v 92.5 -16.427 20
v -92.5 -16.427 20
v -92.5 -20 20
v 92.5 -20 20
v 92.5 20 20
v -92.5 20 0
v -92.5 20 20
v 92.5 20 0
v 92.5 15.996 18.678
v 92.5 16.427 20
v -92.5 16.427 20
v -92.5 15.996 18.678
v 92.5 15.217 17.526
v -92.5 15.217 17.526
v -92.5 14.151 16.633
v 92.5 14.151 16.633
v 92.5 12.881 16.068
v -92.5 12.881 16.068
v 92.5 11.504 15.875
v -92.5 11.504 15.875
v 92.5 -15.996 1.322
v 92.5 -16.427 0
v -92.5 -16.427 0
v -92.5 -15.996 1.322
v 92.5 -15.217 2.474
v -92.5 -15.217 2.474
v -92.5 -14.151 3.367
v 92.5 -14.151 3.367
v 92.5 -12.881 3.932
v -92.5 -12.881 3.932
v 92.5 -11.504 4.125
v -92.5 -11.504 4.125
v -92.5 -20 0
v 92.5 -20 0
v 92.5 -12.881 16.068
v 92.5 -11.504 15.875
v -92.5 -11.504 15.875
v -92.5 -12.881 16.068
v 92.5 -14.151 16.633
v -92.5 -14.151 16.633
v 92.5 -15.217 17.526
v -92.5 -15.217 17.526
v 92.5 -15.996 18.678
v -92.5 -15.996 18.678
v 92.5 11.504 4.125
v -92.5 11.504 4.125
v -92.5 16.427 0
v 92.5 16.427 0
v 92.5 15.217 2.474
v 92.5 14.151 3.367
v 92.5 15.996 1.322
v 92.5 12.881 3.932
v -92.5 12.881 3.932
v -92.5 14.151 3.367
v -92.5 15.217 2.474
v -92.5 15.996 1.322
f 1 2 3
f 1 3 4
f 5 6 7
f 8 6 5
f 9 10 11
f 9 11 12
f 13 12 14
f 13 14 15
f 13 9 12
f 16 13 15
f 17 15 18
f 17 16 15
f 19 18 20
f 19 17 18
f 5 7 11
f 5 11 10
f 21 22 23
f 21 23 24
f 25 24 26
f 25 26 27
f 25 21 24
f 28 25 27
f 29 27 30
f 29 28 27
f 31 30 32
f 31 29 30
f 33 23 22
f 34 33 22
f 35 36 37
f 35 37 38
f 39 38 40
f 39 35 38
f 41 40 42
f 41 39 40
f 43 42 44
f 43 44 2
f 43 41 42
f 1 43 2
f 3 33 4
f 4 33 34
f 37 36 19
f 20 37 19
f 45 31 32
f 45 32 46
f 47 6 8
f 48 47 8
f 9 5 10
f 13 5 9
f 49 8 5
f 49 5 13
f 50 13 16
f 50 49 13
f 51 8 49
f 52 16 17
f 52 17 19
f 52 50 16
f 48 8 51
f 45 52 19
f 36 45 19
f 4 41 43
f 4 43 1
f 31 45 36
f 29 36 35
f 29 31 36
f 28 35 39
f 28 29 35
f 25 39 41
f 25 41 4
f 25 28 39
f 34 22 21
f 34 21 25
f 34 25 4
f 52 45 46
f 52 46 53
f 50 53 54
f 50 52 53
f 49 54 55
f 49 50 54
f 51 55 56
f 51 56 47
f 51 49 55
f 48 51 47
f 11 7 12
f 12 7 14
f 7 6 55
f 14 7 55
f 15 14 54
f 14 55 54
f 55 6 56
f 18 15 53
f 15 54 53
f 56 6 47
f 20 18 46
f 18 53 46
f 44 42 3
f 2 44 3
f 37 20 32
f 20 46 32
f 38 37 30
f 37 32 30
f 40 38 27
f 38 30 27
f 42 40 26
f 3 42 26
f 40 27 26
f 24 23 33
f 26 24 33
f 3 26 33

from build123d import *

# Parameters (mm, degrees)
SKETCH1_W           = 185
SKETCH1_H           = 40
BOSS_EXTRUDE1_DEPTH = 20
SKETCH2_W           = 8.25003803
SKETCH2_H           = 32.854024614
CUT_EXTRUDE1_DEPTH  = 188.149672722
FILLET1_R           = 5


with BuildPart() as part:
    # Sketch1 → Boss-Extrude1 (new body)
    with BuildSketch(Plane.XY):
        Rectangle(SKETCH1_W, SKETCH1_H)
    extrude(amount=BOSS_EXTRUDE1_DEPTH)

    # Sketch2 → Cut-Extrude1 (cut, through all)
    with BuildSketch(Plane(origin=(92.5, 0, 0), x_dir=(0, 0, -1), z_dir=(1, 0, 0))):
        with Locations((-20, 0)):
            Rectangle(SKETCH2_W, SKETCH2_H)
        Rectangle(SKETCH2_W, SKETCH2_H)
    extrude(amount=-CUT_EXTRUDE1_DEPTH, mode=Mode.SUBTRACT)

    # Fillet1
    # the kernel refuses this fillet: 5 mm, written as the material it adds along each edge
    with BuildSketch(Plane(origin=(92.5, 16.427012307, 4.125019015), x_dir=(0, 0, -1), z_dir=(-1, 0, 0)), Plane(origin=(92.5, -16.427012307, 15.874980985), x_dir=(0, 0, 1), z_dir=(-1, 0, 0))) as fillet1_piece_1:
        with BuildLine():
            CenterArc((5, 4.922845547), FILLET1_R, 180, 79.921563206)
            Line((0, 4.922845547), (-0.1, 4.922845547))
            Line((-0.1, 4.922845547), (-0.1, 0))
            Line((-0.1, 0), (0, -0.1))
            ThreePointArc((0, -0.1), (2.062509508, -0.1), (4.107519396, -0.098456911))
            Line((4.107519396, -0.098456911), (4.125019015, 0))
        make_face()
    extrude(amount=185)
    with BuildSketch(Plane(origin=(92.5, -16.427012307, 4.125019015), x_dir=(0, 1, 0), z_dir=(-1, 0, 0)), Plane(origin=(92.5, 16.427012307, 15.874980985), x_dir=(0, -1, 0), z_dir=(-1, 0, 0))) as fillet1_piece_2:
        with BuildLine():
            CenterArc((4.922845547, 5), FILLET1_R, 190.078436794, 79.921563206)
            Line((0, 4.125019015), (-0.098456911, 4.107519396))
            ThreePointArc((-0.098456911, 4.107519396), (-0.1, 2.062509508), (-0.1, 0))
            Line((-0.1, 0), (0, -0.1))
            Line((0, -0.1), (4.922845547, -0.1))
            Line((4.922845547, -0.1), (4.922845547, 0))
        make_face()
    extrude(amount=185)


solid = part.part
